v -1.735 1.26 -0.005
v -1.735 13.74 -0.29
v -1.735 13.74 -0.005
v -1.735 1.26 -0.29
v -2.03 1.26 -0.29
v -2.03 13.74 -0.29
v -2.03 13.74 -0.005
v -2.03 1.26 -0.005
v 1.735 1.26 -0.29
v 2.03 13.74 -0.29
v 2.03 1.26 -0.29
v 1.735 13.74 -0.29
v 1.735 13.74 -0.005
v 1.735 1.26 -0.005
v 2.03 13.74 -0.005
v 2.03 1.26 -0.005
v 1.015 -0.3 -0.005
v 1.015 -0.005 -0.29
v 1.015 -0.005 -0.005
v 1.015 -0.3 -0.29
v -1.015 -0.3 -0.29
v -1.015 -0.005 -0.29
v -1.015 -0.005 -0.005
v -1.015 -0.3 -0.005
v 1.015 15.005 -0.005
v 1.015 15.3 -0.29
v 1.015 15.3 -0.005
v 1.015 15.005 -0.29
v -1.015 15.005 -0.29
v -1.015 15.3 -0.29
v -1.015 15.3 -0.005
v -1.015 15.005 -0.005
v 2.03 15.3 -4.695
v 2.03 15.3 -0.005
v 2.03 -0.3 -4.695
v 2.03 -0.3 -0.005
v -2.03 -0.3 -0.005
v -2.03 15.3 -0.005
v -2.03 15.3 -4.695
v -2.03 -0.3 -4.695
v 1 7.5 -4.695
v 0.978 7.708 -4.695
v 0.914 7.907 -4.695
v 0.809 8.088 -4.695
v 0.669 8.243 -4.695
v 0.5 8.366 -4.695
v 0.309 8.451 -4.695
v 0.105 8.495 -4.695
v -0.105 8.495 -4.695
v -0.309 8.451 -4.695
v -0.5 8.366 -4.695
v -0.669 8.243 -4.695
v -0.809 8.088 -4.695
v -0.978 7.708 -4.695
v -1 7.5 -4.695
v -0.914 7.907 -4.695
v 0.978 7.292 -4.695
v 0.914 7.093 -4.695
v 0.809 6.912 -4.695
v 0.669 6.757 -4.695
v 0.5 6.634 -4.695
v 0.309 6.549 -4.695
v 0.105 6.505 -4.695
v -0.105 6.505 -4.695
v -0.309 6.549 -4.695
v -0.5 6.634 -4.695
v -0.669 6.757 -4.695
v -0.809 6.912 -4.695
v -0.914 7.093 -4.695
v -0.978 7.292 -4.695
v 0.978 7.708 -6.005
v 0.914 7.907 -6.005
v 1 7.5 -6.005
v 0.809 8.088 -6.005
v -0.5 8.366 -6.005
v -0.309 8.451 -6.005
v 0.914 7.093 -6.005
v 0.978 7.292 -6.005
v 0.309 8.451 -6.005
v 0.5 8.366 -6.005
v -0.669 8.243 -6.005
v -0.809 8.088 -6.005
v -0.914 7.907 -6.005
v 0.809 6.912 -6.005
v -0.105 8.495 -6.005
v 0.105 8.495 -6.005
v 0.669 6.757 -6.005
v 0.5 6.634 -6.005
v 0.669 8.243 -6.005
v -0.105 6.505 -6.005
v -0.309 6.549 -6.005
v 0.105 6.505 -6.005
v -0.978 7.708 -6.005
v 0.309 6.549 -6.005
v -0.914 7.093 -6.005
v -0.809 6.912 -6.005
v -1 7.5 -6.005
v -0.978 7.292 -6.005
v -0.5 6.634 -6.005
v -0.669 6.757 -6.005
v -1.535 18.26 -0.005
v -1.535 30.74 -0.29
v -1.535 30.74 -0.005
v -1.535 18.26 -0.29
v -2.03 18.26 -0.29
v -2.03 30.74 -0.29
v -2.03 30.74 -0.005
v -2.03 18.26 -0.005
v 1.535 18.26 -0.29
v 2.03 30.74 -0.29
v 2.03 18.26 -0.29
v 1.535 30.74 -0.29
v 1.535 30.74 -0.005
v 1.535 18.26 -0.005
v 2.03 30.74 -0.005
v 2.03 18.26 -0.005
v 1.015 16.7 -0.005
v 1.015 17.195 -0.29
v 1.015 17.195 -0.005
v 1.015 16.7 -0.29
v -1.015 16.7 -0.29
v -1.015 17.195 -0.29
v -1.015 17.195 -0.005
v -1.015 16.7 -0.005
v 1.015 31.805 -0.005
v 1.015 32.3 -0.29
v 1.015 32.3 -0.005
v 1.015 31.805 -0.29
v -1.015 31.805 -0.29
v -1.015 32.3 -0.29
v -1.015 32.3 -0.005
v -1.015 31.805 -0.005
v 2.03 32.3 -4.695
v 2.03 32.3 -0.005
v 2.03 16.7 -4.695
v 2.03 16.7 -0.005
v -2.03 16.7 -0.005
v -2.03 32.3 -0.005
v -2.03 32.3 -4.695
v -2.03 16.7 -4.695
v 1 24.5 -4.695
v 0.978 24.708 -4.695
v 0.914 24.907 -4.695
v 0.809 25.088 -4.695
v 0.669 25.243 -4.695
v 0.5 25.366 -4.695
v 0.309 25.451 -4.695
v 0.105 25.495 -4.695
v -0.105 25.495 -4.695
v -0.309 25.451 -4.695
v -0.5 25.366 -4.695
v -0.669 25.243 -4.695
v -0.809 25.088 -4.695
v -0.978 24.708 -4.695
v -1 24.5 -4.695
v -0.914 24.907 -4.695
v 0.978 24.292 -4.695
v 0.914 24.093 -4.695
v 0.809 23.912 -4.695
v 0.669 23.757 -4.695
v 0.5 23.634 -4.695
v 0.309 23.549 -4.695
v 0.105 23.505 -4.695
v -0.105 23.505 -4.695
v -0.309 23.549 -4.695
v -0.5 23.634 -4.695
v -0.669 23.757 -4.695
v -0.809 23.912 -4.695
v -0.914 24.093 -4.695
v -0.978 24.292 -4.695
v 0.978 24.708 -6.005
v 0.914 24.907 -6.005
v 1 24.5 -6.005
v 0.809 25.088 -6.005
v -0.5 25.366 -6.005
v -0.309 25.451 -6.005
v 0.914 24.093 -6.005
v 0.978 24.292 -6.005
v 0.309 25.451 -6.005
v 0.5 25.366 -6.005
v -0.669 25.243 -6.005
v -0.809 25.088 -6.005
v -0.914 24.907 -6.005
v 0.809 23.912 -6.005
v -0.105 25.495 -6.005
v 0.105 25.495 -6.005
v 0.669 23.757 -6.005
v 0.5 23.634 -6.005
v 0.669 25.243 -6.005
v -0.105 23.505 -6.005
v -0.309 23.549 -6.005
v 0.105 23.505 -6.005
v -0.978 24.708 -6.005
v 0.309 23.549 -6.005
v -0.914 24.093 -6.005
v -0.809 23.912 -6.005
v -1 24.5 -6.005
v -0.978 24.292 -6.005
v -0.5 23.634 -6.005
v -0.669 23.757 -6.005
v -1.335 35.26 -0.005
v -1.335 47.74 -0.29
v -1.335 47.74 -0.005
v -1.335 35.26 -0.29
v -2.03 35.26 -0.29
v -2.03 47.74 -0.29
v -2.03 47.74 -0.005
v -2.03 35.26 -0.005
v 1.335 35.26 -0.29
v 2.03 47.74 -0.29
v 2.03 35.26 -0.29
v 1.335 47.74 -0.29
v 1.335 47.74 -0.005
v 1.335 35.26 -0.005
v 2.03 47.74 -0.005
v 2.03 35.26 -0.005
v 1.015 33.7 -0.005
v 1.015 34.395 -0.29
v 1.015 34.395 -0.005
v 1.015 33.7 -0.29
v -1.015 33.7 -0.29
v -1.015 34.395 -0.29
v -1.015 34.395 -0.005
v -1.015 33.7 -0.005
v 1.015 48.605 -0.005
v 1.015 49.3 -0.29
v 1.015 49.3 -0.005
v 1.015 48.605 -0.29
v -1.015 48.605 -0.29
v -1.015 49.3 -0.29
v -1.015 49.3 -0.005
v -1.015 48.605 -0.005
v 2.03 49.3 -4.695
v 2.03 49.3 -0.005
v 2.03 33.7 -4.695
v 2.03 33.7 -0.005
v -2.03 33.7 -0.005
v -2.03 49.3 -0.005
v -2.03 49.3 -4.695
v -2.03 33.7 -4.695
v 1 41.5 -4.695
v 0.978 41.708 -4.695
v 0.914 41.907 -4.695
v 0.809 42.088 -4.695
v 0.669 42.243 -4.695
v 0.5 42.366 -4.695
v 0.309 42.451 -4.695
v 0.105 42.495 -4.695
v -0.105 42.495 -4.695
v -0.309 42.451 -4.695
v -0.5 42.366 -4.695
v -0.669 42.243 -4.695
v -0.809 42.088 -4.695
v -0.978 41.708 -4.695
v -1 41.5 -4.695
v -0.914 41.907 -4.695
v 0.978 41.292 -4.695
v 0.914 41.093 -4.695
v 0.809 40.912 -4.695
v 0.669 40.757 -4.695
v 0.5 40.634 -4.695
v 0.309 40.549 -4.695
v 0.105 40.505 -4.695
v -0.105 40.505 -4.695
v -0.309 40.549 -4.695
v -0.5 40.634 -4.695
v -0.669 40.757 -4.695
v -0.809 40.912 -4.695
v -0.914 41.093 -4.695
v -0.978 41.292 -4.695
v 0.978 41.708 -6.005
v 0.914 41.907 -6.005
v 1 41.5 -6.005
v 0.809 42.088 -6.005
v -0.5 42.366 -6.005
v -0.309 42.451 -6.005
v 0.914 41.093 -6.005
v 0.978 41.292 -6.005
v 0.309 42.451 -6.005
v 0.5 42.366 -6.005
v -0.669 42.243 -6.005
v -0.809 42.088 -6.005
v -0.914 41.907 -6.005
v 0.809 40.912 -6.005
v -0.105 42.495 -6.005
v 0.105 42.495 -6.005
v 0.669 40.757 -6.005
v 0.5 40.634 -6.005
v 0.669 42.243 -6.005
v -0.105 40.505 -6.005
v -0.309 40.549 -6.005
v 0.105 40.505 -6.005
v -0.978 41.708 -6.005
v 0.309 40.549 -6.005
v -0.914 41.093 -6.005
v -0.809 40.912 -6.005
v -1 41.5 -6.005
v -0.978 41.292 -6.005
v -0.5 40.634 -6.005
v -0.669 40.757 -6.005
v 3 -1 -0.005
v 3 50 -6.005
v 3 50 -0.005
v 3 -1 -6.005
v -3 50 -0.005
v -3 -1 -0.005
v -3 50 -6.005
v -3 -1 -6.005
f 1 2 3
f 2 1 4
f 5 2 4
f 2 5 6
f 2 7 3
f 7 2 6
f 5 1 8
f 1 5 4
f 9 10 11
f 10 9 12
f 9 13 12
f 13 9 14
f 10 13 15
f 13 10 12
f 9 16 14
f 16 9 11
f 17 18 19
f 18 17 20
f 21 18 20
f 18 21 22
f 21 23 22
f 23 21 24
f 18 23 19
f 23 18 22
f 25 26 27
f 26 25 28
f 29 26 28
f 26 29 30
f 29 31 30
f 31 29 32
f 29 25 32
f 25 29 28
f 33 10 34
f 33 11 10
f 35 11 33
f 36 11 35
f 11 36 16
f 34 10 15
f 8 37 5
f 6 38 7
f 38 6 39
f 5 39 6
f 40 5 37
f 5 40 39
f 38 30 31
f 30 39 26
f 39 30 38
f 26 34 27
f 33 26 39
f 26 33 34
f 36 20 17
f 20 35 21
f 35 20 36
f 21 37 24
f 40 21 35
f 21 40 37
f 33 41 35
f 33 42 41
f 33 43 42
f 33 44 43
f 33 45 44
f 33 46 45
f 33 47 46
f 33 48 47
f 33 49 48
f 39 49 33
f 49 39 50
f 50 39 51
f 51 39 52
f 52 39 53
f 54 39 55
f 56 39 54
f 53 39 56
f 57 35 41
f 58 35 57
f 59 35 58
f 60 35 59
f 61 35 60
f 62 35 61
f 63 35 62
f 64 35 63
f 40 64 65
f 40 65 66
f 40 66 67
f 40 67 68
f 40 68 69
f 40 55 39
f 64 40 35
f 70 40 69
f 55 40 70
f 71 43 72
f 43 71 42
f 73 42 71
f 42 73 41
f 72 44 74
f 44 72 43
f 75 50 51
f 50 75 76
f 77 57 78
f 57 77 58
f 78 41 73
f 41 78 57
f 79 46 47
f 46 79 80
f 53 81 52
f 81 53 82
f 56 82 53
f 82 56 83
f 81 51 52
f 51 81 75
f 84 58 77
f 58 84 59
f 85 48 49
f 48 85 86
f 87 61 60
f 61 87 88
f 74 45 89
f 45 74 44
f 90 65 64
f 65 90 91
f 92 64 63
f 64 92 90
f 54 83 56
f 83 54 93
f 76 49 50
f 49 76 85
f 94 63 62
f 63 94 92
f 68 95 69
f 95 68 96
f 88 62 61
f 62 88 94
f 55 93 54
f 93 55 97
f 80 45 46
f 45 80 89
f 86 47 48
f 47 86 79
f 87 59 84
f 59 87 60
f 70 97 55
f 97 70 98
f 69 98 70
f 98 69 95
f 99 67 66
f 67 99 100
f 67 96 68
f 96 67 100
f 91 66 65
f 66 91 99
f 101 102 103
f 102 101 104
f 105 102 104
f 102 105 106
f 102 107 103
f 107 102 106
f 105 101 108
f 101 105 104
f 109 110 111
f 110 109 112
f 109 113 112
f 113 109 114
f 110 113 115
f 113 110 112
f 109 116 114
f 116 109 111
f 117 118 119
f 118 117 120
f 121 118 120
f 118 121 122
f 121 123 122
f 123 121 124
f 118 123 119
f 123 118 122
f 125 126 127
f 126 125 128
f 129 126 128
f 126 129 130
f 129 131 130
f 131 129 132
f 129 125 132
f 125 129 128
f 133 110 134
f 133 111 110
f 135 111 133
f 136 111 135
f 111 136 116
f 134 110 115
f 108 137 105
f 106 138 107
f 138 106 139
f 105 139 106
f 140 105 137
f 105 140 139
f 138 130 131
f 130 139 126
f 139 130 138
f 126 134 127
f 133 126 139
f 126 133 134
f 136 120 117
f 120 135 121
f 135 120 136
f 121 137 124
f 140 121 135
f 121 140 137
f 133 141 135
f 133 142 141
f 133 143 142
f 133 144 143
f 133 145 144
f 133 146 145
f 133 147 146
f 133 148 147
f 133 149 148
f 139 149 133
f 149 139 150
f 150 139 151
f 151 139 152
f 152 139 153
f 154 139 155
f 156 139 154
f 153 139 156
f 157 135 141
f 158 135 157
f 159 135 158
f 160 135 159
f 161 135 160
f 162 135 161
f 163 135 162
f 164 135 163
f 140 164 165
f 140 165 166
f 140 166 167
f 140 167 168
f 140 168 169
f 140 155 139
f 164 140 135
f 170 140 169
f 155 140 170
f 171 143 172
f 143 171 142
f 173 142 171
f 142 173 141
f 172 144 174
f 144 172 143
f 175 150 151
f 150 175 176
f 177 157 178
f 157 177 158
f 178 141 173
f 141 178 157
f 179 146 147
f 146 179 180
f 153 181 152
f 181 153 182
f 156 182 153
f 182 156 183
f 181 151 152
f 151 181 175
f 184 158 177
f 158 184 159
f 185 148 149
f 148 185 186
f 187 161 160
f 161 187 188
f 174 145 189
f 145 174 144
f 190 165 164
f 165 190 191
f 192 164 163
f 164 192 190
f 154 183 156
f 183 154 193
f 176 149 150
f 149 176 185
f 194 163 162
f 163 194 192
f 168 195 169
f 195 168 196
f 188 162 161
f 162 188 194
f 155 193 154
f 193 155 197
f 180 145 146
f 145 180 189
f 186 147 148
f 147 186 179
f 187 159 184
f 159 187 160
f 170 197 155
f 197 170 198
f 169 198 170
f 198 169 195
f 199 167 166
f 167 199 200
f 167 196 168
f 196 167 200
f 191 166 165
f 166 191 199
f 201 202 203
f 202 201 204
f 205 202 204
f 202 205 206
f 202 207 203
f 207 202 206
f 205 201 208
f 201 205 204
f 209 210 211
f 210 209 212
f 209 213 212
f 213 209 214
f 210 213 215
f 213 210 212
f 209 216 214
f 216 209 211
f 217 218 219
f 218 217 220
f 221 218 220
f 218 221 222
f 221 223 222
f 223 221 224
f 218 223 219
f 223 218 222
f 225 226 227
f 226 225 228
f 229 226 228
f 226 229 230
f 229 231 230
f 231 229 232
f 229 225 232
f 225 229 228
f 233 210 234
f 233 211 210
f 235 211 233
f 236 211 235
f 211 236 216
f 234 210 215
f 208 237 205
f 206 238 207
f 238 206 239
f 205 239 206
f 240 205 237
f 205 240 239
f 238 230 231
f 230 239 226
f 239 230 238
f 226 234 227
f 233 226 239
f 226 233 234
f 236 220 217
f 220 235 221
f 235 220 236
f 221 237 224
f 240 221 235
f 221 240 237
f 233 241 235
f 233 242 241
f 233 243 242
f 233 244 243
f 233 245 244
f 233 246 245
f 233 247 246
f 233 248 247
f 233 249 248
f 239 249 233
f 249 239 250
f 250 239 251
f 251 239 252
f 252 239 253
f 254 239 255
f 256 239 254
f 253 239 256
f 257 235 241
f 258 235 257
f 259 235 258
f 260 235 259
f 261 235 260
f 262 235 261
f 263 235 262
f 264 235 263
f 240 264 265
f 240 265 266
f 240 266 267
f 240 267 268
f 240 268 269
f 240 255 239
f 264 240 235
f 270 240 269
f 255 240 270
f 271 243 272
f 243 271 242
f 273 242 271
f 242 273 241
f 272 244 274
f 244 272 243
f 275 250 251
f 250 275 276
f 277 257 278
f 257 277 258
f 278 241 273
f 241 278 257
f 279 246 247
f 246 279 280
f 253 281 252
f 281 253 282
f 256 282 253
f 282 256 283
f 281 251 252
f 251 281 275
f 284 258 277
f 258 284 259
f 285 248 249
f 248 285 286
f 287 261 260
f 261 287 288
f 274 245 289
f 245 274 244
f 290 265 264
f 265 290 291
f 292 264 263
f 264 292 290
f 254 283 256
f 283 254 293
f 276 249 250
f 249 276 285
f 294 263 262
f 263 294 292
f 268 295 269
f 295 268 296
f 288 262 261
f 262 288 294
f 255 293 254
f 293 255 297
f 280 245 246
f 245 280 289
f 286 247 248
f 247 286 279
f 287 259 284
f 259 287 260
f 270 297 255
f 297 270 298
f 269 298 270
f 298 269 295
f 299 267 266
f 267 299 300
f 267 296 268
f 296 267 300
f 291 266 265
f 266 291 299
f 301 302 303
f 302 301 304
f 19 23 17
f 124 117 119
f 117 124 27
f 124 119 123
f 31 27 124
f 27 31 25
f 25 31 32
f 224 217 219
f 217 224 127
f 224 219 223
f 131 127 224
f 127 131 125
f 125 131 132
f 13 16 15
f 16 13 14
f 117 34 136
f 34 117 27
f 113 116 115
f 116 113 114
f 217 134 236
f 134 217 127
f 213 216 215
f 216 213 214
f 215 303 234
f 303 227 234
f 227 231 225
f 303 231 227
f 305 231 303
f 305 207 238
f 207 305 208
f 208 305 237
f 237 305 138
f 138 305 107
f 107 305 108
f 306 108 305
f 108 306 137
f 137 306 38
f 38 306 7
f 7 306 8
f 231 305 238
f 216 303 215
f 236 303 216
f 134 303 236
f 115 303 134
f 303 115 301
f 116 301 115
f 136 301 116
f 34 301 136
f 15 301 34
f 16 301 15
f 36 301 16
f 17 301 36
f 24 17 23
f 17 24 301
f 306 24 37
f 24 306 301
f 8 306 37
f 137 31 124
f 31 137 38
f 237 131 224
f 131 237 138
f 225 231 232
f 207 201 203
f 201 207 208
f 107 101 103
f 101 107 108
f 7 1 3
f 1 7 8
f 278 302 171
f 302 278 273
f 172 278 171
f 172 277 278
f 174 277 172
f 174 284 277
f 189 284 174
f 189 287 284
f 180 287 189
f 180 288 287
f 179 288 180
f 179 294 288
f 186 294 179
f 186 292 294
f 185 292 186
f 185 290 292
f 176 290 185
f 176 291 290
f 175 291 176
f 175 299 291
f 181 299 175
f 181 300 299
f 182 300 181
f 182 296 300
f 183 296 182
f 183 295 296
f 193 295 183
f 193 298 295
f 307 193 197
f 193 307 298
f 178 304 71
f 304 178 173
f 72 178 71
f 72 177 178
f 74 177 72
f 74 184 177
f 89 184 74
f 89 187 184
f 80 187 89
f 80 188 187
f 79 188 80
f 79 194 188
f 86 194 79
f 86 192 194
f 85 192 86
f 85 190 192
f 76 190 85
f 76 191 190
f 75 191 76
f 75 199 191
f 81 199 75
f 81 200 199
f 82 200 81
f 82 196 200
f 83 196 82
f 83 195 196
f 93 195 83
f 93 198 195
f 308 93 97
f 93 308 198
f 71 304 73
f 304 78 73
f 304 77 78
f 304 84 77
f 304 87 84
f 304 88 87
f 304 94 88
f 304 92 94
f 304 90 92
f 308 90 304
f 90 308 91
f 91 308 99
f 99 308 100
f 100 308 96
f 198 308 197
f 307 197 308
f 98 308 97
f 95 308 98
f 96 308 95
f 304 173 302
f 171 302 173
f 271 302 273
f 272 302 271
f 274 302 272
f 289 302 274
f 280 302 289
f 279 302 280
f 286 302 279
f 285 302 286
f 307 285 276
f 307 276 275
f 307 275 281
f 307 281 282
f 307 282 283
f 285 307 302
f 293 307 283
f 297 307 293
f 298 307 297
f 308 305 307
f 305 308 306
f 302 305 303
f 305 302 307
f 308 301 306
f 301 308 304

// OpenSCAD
$fs = 0.1;

delta = 0.005; //for better preview rendering. set to 0 for 'perfect' 
magnet_w = 4;
magnet_h = 4;
magnet_l = 15;



//magnet();

wall = 1;
count = 3;
difference() {
  translate([-magnet_w/2-wall,-wall,-6-delta])
    cube([magnet_w+2*wall,(magnet_l+2*wall)*count,6]);
  translate([0,magnet_l/2,0]) {
    magnet_pit(0.3, hole=true);
    translate([0,magnet_l+2*wall,0])
      magnet_pit(0.5, hole=true);
    translate([0,2*(magnet_l+2*wall),0])
      magnet_pit(0.7, hole=true);
  }
}




module magnet_pit(teeth_inset, hole=false) {
  gap_w=0.03; gap_l=0.15; gap_h=0.2;
  w = magnet_w+2*gap_w; l = magnet_l+2*gap_l*2; h = magnet_h+2*gap_h;
  // teeth_inset = 0.2;
  teeth_width = 3; teeth_thickness = 0.3;
  tf_w = 0.5; tf_l = 0.8;
  union() {
    translate([0,0,-h/2-teeth_thickness+delta])
      cube([w, l, h], center=true);
    translate([0,0,-teeth_thickness/2]) {
      difference() {
        cube([w,l,teeth_thickness], center=true);
        translate([0,0,0.01]) {
          translate([-(w-teeth_inset)/2-delta,0,0]) cube([teeth_inset,l*tf_l,teeth_thickness], center=true);
          translate([(w-teeth_inset)/2+delta,0,0]) cube([teeth_inset,l*tf_l,teeth_thickness], center=true);
          translate([0,-(l-teeth_inset)/2-delta,0]) cube([w*tf_w,teeth_inset,teeth_thickness], center=true);
          translate([0,(l-teeth_inset)/2+delta,0]) cube([w*tf_w,teeth_inset,teeth_thickness], center=true);
        }
      }
    }
    if (hole) {
      hole_l = 5;
      translate([0,0,-h-hole_l/2-teeth_thickness+delta*2])
        cylinder(hole_l, d=2, center=true);
    }
  }
}

module magnet(top=-1) {
  translate([-magnet_w/2,-magnet_l/2,-magnet_h/2+magnet_h/2*top]) {
    color("red") cube([magnet_w, magnet_l, magnet_h/2]);
    color("green") translate([0,0, magnet_h/2]) cube([magnet_w, magnet_l, magnet_h/2]);
  }
}
